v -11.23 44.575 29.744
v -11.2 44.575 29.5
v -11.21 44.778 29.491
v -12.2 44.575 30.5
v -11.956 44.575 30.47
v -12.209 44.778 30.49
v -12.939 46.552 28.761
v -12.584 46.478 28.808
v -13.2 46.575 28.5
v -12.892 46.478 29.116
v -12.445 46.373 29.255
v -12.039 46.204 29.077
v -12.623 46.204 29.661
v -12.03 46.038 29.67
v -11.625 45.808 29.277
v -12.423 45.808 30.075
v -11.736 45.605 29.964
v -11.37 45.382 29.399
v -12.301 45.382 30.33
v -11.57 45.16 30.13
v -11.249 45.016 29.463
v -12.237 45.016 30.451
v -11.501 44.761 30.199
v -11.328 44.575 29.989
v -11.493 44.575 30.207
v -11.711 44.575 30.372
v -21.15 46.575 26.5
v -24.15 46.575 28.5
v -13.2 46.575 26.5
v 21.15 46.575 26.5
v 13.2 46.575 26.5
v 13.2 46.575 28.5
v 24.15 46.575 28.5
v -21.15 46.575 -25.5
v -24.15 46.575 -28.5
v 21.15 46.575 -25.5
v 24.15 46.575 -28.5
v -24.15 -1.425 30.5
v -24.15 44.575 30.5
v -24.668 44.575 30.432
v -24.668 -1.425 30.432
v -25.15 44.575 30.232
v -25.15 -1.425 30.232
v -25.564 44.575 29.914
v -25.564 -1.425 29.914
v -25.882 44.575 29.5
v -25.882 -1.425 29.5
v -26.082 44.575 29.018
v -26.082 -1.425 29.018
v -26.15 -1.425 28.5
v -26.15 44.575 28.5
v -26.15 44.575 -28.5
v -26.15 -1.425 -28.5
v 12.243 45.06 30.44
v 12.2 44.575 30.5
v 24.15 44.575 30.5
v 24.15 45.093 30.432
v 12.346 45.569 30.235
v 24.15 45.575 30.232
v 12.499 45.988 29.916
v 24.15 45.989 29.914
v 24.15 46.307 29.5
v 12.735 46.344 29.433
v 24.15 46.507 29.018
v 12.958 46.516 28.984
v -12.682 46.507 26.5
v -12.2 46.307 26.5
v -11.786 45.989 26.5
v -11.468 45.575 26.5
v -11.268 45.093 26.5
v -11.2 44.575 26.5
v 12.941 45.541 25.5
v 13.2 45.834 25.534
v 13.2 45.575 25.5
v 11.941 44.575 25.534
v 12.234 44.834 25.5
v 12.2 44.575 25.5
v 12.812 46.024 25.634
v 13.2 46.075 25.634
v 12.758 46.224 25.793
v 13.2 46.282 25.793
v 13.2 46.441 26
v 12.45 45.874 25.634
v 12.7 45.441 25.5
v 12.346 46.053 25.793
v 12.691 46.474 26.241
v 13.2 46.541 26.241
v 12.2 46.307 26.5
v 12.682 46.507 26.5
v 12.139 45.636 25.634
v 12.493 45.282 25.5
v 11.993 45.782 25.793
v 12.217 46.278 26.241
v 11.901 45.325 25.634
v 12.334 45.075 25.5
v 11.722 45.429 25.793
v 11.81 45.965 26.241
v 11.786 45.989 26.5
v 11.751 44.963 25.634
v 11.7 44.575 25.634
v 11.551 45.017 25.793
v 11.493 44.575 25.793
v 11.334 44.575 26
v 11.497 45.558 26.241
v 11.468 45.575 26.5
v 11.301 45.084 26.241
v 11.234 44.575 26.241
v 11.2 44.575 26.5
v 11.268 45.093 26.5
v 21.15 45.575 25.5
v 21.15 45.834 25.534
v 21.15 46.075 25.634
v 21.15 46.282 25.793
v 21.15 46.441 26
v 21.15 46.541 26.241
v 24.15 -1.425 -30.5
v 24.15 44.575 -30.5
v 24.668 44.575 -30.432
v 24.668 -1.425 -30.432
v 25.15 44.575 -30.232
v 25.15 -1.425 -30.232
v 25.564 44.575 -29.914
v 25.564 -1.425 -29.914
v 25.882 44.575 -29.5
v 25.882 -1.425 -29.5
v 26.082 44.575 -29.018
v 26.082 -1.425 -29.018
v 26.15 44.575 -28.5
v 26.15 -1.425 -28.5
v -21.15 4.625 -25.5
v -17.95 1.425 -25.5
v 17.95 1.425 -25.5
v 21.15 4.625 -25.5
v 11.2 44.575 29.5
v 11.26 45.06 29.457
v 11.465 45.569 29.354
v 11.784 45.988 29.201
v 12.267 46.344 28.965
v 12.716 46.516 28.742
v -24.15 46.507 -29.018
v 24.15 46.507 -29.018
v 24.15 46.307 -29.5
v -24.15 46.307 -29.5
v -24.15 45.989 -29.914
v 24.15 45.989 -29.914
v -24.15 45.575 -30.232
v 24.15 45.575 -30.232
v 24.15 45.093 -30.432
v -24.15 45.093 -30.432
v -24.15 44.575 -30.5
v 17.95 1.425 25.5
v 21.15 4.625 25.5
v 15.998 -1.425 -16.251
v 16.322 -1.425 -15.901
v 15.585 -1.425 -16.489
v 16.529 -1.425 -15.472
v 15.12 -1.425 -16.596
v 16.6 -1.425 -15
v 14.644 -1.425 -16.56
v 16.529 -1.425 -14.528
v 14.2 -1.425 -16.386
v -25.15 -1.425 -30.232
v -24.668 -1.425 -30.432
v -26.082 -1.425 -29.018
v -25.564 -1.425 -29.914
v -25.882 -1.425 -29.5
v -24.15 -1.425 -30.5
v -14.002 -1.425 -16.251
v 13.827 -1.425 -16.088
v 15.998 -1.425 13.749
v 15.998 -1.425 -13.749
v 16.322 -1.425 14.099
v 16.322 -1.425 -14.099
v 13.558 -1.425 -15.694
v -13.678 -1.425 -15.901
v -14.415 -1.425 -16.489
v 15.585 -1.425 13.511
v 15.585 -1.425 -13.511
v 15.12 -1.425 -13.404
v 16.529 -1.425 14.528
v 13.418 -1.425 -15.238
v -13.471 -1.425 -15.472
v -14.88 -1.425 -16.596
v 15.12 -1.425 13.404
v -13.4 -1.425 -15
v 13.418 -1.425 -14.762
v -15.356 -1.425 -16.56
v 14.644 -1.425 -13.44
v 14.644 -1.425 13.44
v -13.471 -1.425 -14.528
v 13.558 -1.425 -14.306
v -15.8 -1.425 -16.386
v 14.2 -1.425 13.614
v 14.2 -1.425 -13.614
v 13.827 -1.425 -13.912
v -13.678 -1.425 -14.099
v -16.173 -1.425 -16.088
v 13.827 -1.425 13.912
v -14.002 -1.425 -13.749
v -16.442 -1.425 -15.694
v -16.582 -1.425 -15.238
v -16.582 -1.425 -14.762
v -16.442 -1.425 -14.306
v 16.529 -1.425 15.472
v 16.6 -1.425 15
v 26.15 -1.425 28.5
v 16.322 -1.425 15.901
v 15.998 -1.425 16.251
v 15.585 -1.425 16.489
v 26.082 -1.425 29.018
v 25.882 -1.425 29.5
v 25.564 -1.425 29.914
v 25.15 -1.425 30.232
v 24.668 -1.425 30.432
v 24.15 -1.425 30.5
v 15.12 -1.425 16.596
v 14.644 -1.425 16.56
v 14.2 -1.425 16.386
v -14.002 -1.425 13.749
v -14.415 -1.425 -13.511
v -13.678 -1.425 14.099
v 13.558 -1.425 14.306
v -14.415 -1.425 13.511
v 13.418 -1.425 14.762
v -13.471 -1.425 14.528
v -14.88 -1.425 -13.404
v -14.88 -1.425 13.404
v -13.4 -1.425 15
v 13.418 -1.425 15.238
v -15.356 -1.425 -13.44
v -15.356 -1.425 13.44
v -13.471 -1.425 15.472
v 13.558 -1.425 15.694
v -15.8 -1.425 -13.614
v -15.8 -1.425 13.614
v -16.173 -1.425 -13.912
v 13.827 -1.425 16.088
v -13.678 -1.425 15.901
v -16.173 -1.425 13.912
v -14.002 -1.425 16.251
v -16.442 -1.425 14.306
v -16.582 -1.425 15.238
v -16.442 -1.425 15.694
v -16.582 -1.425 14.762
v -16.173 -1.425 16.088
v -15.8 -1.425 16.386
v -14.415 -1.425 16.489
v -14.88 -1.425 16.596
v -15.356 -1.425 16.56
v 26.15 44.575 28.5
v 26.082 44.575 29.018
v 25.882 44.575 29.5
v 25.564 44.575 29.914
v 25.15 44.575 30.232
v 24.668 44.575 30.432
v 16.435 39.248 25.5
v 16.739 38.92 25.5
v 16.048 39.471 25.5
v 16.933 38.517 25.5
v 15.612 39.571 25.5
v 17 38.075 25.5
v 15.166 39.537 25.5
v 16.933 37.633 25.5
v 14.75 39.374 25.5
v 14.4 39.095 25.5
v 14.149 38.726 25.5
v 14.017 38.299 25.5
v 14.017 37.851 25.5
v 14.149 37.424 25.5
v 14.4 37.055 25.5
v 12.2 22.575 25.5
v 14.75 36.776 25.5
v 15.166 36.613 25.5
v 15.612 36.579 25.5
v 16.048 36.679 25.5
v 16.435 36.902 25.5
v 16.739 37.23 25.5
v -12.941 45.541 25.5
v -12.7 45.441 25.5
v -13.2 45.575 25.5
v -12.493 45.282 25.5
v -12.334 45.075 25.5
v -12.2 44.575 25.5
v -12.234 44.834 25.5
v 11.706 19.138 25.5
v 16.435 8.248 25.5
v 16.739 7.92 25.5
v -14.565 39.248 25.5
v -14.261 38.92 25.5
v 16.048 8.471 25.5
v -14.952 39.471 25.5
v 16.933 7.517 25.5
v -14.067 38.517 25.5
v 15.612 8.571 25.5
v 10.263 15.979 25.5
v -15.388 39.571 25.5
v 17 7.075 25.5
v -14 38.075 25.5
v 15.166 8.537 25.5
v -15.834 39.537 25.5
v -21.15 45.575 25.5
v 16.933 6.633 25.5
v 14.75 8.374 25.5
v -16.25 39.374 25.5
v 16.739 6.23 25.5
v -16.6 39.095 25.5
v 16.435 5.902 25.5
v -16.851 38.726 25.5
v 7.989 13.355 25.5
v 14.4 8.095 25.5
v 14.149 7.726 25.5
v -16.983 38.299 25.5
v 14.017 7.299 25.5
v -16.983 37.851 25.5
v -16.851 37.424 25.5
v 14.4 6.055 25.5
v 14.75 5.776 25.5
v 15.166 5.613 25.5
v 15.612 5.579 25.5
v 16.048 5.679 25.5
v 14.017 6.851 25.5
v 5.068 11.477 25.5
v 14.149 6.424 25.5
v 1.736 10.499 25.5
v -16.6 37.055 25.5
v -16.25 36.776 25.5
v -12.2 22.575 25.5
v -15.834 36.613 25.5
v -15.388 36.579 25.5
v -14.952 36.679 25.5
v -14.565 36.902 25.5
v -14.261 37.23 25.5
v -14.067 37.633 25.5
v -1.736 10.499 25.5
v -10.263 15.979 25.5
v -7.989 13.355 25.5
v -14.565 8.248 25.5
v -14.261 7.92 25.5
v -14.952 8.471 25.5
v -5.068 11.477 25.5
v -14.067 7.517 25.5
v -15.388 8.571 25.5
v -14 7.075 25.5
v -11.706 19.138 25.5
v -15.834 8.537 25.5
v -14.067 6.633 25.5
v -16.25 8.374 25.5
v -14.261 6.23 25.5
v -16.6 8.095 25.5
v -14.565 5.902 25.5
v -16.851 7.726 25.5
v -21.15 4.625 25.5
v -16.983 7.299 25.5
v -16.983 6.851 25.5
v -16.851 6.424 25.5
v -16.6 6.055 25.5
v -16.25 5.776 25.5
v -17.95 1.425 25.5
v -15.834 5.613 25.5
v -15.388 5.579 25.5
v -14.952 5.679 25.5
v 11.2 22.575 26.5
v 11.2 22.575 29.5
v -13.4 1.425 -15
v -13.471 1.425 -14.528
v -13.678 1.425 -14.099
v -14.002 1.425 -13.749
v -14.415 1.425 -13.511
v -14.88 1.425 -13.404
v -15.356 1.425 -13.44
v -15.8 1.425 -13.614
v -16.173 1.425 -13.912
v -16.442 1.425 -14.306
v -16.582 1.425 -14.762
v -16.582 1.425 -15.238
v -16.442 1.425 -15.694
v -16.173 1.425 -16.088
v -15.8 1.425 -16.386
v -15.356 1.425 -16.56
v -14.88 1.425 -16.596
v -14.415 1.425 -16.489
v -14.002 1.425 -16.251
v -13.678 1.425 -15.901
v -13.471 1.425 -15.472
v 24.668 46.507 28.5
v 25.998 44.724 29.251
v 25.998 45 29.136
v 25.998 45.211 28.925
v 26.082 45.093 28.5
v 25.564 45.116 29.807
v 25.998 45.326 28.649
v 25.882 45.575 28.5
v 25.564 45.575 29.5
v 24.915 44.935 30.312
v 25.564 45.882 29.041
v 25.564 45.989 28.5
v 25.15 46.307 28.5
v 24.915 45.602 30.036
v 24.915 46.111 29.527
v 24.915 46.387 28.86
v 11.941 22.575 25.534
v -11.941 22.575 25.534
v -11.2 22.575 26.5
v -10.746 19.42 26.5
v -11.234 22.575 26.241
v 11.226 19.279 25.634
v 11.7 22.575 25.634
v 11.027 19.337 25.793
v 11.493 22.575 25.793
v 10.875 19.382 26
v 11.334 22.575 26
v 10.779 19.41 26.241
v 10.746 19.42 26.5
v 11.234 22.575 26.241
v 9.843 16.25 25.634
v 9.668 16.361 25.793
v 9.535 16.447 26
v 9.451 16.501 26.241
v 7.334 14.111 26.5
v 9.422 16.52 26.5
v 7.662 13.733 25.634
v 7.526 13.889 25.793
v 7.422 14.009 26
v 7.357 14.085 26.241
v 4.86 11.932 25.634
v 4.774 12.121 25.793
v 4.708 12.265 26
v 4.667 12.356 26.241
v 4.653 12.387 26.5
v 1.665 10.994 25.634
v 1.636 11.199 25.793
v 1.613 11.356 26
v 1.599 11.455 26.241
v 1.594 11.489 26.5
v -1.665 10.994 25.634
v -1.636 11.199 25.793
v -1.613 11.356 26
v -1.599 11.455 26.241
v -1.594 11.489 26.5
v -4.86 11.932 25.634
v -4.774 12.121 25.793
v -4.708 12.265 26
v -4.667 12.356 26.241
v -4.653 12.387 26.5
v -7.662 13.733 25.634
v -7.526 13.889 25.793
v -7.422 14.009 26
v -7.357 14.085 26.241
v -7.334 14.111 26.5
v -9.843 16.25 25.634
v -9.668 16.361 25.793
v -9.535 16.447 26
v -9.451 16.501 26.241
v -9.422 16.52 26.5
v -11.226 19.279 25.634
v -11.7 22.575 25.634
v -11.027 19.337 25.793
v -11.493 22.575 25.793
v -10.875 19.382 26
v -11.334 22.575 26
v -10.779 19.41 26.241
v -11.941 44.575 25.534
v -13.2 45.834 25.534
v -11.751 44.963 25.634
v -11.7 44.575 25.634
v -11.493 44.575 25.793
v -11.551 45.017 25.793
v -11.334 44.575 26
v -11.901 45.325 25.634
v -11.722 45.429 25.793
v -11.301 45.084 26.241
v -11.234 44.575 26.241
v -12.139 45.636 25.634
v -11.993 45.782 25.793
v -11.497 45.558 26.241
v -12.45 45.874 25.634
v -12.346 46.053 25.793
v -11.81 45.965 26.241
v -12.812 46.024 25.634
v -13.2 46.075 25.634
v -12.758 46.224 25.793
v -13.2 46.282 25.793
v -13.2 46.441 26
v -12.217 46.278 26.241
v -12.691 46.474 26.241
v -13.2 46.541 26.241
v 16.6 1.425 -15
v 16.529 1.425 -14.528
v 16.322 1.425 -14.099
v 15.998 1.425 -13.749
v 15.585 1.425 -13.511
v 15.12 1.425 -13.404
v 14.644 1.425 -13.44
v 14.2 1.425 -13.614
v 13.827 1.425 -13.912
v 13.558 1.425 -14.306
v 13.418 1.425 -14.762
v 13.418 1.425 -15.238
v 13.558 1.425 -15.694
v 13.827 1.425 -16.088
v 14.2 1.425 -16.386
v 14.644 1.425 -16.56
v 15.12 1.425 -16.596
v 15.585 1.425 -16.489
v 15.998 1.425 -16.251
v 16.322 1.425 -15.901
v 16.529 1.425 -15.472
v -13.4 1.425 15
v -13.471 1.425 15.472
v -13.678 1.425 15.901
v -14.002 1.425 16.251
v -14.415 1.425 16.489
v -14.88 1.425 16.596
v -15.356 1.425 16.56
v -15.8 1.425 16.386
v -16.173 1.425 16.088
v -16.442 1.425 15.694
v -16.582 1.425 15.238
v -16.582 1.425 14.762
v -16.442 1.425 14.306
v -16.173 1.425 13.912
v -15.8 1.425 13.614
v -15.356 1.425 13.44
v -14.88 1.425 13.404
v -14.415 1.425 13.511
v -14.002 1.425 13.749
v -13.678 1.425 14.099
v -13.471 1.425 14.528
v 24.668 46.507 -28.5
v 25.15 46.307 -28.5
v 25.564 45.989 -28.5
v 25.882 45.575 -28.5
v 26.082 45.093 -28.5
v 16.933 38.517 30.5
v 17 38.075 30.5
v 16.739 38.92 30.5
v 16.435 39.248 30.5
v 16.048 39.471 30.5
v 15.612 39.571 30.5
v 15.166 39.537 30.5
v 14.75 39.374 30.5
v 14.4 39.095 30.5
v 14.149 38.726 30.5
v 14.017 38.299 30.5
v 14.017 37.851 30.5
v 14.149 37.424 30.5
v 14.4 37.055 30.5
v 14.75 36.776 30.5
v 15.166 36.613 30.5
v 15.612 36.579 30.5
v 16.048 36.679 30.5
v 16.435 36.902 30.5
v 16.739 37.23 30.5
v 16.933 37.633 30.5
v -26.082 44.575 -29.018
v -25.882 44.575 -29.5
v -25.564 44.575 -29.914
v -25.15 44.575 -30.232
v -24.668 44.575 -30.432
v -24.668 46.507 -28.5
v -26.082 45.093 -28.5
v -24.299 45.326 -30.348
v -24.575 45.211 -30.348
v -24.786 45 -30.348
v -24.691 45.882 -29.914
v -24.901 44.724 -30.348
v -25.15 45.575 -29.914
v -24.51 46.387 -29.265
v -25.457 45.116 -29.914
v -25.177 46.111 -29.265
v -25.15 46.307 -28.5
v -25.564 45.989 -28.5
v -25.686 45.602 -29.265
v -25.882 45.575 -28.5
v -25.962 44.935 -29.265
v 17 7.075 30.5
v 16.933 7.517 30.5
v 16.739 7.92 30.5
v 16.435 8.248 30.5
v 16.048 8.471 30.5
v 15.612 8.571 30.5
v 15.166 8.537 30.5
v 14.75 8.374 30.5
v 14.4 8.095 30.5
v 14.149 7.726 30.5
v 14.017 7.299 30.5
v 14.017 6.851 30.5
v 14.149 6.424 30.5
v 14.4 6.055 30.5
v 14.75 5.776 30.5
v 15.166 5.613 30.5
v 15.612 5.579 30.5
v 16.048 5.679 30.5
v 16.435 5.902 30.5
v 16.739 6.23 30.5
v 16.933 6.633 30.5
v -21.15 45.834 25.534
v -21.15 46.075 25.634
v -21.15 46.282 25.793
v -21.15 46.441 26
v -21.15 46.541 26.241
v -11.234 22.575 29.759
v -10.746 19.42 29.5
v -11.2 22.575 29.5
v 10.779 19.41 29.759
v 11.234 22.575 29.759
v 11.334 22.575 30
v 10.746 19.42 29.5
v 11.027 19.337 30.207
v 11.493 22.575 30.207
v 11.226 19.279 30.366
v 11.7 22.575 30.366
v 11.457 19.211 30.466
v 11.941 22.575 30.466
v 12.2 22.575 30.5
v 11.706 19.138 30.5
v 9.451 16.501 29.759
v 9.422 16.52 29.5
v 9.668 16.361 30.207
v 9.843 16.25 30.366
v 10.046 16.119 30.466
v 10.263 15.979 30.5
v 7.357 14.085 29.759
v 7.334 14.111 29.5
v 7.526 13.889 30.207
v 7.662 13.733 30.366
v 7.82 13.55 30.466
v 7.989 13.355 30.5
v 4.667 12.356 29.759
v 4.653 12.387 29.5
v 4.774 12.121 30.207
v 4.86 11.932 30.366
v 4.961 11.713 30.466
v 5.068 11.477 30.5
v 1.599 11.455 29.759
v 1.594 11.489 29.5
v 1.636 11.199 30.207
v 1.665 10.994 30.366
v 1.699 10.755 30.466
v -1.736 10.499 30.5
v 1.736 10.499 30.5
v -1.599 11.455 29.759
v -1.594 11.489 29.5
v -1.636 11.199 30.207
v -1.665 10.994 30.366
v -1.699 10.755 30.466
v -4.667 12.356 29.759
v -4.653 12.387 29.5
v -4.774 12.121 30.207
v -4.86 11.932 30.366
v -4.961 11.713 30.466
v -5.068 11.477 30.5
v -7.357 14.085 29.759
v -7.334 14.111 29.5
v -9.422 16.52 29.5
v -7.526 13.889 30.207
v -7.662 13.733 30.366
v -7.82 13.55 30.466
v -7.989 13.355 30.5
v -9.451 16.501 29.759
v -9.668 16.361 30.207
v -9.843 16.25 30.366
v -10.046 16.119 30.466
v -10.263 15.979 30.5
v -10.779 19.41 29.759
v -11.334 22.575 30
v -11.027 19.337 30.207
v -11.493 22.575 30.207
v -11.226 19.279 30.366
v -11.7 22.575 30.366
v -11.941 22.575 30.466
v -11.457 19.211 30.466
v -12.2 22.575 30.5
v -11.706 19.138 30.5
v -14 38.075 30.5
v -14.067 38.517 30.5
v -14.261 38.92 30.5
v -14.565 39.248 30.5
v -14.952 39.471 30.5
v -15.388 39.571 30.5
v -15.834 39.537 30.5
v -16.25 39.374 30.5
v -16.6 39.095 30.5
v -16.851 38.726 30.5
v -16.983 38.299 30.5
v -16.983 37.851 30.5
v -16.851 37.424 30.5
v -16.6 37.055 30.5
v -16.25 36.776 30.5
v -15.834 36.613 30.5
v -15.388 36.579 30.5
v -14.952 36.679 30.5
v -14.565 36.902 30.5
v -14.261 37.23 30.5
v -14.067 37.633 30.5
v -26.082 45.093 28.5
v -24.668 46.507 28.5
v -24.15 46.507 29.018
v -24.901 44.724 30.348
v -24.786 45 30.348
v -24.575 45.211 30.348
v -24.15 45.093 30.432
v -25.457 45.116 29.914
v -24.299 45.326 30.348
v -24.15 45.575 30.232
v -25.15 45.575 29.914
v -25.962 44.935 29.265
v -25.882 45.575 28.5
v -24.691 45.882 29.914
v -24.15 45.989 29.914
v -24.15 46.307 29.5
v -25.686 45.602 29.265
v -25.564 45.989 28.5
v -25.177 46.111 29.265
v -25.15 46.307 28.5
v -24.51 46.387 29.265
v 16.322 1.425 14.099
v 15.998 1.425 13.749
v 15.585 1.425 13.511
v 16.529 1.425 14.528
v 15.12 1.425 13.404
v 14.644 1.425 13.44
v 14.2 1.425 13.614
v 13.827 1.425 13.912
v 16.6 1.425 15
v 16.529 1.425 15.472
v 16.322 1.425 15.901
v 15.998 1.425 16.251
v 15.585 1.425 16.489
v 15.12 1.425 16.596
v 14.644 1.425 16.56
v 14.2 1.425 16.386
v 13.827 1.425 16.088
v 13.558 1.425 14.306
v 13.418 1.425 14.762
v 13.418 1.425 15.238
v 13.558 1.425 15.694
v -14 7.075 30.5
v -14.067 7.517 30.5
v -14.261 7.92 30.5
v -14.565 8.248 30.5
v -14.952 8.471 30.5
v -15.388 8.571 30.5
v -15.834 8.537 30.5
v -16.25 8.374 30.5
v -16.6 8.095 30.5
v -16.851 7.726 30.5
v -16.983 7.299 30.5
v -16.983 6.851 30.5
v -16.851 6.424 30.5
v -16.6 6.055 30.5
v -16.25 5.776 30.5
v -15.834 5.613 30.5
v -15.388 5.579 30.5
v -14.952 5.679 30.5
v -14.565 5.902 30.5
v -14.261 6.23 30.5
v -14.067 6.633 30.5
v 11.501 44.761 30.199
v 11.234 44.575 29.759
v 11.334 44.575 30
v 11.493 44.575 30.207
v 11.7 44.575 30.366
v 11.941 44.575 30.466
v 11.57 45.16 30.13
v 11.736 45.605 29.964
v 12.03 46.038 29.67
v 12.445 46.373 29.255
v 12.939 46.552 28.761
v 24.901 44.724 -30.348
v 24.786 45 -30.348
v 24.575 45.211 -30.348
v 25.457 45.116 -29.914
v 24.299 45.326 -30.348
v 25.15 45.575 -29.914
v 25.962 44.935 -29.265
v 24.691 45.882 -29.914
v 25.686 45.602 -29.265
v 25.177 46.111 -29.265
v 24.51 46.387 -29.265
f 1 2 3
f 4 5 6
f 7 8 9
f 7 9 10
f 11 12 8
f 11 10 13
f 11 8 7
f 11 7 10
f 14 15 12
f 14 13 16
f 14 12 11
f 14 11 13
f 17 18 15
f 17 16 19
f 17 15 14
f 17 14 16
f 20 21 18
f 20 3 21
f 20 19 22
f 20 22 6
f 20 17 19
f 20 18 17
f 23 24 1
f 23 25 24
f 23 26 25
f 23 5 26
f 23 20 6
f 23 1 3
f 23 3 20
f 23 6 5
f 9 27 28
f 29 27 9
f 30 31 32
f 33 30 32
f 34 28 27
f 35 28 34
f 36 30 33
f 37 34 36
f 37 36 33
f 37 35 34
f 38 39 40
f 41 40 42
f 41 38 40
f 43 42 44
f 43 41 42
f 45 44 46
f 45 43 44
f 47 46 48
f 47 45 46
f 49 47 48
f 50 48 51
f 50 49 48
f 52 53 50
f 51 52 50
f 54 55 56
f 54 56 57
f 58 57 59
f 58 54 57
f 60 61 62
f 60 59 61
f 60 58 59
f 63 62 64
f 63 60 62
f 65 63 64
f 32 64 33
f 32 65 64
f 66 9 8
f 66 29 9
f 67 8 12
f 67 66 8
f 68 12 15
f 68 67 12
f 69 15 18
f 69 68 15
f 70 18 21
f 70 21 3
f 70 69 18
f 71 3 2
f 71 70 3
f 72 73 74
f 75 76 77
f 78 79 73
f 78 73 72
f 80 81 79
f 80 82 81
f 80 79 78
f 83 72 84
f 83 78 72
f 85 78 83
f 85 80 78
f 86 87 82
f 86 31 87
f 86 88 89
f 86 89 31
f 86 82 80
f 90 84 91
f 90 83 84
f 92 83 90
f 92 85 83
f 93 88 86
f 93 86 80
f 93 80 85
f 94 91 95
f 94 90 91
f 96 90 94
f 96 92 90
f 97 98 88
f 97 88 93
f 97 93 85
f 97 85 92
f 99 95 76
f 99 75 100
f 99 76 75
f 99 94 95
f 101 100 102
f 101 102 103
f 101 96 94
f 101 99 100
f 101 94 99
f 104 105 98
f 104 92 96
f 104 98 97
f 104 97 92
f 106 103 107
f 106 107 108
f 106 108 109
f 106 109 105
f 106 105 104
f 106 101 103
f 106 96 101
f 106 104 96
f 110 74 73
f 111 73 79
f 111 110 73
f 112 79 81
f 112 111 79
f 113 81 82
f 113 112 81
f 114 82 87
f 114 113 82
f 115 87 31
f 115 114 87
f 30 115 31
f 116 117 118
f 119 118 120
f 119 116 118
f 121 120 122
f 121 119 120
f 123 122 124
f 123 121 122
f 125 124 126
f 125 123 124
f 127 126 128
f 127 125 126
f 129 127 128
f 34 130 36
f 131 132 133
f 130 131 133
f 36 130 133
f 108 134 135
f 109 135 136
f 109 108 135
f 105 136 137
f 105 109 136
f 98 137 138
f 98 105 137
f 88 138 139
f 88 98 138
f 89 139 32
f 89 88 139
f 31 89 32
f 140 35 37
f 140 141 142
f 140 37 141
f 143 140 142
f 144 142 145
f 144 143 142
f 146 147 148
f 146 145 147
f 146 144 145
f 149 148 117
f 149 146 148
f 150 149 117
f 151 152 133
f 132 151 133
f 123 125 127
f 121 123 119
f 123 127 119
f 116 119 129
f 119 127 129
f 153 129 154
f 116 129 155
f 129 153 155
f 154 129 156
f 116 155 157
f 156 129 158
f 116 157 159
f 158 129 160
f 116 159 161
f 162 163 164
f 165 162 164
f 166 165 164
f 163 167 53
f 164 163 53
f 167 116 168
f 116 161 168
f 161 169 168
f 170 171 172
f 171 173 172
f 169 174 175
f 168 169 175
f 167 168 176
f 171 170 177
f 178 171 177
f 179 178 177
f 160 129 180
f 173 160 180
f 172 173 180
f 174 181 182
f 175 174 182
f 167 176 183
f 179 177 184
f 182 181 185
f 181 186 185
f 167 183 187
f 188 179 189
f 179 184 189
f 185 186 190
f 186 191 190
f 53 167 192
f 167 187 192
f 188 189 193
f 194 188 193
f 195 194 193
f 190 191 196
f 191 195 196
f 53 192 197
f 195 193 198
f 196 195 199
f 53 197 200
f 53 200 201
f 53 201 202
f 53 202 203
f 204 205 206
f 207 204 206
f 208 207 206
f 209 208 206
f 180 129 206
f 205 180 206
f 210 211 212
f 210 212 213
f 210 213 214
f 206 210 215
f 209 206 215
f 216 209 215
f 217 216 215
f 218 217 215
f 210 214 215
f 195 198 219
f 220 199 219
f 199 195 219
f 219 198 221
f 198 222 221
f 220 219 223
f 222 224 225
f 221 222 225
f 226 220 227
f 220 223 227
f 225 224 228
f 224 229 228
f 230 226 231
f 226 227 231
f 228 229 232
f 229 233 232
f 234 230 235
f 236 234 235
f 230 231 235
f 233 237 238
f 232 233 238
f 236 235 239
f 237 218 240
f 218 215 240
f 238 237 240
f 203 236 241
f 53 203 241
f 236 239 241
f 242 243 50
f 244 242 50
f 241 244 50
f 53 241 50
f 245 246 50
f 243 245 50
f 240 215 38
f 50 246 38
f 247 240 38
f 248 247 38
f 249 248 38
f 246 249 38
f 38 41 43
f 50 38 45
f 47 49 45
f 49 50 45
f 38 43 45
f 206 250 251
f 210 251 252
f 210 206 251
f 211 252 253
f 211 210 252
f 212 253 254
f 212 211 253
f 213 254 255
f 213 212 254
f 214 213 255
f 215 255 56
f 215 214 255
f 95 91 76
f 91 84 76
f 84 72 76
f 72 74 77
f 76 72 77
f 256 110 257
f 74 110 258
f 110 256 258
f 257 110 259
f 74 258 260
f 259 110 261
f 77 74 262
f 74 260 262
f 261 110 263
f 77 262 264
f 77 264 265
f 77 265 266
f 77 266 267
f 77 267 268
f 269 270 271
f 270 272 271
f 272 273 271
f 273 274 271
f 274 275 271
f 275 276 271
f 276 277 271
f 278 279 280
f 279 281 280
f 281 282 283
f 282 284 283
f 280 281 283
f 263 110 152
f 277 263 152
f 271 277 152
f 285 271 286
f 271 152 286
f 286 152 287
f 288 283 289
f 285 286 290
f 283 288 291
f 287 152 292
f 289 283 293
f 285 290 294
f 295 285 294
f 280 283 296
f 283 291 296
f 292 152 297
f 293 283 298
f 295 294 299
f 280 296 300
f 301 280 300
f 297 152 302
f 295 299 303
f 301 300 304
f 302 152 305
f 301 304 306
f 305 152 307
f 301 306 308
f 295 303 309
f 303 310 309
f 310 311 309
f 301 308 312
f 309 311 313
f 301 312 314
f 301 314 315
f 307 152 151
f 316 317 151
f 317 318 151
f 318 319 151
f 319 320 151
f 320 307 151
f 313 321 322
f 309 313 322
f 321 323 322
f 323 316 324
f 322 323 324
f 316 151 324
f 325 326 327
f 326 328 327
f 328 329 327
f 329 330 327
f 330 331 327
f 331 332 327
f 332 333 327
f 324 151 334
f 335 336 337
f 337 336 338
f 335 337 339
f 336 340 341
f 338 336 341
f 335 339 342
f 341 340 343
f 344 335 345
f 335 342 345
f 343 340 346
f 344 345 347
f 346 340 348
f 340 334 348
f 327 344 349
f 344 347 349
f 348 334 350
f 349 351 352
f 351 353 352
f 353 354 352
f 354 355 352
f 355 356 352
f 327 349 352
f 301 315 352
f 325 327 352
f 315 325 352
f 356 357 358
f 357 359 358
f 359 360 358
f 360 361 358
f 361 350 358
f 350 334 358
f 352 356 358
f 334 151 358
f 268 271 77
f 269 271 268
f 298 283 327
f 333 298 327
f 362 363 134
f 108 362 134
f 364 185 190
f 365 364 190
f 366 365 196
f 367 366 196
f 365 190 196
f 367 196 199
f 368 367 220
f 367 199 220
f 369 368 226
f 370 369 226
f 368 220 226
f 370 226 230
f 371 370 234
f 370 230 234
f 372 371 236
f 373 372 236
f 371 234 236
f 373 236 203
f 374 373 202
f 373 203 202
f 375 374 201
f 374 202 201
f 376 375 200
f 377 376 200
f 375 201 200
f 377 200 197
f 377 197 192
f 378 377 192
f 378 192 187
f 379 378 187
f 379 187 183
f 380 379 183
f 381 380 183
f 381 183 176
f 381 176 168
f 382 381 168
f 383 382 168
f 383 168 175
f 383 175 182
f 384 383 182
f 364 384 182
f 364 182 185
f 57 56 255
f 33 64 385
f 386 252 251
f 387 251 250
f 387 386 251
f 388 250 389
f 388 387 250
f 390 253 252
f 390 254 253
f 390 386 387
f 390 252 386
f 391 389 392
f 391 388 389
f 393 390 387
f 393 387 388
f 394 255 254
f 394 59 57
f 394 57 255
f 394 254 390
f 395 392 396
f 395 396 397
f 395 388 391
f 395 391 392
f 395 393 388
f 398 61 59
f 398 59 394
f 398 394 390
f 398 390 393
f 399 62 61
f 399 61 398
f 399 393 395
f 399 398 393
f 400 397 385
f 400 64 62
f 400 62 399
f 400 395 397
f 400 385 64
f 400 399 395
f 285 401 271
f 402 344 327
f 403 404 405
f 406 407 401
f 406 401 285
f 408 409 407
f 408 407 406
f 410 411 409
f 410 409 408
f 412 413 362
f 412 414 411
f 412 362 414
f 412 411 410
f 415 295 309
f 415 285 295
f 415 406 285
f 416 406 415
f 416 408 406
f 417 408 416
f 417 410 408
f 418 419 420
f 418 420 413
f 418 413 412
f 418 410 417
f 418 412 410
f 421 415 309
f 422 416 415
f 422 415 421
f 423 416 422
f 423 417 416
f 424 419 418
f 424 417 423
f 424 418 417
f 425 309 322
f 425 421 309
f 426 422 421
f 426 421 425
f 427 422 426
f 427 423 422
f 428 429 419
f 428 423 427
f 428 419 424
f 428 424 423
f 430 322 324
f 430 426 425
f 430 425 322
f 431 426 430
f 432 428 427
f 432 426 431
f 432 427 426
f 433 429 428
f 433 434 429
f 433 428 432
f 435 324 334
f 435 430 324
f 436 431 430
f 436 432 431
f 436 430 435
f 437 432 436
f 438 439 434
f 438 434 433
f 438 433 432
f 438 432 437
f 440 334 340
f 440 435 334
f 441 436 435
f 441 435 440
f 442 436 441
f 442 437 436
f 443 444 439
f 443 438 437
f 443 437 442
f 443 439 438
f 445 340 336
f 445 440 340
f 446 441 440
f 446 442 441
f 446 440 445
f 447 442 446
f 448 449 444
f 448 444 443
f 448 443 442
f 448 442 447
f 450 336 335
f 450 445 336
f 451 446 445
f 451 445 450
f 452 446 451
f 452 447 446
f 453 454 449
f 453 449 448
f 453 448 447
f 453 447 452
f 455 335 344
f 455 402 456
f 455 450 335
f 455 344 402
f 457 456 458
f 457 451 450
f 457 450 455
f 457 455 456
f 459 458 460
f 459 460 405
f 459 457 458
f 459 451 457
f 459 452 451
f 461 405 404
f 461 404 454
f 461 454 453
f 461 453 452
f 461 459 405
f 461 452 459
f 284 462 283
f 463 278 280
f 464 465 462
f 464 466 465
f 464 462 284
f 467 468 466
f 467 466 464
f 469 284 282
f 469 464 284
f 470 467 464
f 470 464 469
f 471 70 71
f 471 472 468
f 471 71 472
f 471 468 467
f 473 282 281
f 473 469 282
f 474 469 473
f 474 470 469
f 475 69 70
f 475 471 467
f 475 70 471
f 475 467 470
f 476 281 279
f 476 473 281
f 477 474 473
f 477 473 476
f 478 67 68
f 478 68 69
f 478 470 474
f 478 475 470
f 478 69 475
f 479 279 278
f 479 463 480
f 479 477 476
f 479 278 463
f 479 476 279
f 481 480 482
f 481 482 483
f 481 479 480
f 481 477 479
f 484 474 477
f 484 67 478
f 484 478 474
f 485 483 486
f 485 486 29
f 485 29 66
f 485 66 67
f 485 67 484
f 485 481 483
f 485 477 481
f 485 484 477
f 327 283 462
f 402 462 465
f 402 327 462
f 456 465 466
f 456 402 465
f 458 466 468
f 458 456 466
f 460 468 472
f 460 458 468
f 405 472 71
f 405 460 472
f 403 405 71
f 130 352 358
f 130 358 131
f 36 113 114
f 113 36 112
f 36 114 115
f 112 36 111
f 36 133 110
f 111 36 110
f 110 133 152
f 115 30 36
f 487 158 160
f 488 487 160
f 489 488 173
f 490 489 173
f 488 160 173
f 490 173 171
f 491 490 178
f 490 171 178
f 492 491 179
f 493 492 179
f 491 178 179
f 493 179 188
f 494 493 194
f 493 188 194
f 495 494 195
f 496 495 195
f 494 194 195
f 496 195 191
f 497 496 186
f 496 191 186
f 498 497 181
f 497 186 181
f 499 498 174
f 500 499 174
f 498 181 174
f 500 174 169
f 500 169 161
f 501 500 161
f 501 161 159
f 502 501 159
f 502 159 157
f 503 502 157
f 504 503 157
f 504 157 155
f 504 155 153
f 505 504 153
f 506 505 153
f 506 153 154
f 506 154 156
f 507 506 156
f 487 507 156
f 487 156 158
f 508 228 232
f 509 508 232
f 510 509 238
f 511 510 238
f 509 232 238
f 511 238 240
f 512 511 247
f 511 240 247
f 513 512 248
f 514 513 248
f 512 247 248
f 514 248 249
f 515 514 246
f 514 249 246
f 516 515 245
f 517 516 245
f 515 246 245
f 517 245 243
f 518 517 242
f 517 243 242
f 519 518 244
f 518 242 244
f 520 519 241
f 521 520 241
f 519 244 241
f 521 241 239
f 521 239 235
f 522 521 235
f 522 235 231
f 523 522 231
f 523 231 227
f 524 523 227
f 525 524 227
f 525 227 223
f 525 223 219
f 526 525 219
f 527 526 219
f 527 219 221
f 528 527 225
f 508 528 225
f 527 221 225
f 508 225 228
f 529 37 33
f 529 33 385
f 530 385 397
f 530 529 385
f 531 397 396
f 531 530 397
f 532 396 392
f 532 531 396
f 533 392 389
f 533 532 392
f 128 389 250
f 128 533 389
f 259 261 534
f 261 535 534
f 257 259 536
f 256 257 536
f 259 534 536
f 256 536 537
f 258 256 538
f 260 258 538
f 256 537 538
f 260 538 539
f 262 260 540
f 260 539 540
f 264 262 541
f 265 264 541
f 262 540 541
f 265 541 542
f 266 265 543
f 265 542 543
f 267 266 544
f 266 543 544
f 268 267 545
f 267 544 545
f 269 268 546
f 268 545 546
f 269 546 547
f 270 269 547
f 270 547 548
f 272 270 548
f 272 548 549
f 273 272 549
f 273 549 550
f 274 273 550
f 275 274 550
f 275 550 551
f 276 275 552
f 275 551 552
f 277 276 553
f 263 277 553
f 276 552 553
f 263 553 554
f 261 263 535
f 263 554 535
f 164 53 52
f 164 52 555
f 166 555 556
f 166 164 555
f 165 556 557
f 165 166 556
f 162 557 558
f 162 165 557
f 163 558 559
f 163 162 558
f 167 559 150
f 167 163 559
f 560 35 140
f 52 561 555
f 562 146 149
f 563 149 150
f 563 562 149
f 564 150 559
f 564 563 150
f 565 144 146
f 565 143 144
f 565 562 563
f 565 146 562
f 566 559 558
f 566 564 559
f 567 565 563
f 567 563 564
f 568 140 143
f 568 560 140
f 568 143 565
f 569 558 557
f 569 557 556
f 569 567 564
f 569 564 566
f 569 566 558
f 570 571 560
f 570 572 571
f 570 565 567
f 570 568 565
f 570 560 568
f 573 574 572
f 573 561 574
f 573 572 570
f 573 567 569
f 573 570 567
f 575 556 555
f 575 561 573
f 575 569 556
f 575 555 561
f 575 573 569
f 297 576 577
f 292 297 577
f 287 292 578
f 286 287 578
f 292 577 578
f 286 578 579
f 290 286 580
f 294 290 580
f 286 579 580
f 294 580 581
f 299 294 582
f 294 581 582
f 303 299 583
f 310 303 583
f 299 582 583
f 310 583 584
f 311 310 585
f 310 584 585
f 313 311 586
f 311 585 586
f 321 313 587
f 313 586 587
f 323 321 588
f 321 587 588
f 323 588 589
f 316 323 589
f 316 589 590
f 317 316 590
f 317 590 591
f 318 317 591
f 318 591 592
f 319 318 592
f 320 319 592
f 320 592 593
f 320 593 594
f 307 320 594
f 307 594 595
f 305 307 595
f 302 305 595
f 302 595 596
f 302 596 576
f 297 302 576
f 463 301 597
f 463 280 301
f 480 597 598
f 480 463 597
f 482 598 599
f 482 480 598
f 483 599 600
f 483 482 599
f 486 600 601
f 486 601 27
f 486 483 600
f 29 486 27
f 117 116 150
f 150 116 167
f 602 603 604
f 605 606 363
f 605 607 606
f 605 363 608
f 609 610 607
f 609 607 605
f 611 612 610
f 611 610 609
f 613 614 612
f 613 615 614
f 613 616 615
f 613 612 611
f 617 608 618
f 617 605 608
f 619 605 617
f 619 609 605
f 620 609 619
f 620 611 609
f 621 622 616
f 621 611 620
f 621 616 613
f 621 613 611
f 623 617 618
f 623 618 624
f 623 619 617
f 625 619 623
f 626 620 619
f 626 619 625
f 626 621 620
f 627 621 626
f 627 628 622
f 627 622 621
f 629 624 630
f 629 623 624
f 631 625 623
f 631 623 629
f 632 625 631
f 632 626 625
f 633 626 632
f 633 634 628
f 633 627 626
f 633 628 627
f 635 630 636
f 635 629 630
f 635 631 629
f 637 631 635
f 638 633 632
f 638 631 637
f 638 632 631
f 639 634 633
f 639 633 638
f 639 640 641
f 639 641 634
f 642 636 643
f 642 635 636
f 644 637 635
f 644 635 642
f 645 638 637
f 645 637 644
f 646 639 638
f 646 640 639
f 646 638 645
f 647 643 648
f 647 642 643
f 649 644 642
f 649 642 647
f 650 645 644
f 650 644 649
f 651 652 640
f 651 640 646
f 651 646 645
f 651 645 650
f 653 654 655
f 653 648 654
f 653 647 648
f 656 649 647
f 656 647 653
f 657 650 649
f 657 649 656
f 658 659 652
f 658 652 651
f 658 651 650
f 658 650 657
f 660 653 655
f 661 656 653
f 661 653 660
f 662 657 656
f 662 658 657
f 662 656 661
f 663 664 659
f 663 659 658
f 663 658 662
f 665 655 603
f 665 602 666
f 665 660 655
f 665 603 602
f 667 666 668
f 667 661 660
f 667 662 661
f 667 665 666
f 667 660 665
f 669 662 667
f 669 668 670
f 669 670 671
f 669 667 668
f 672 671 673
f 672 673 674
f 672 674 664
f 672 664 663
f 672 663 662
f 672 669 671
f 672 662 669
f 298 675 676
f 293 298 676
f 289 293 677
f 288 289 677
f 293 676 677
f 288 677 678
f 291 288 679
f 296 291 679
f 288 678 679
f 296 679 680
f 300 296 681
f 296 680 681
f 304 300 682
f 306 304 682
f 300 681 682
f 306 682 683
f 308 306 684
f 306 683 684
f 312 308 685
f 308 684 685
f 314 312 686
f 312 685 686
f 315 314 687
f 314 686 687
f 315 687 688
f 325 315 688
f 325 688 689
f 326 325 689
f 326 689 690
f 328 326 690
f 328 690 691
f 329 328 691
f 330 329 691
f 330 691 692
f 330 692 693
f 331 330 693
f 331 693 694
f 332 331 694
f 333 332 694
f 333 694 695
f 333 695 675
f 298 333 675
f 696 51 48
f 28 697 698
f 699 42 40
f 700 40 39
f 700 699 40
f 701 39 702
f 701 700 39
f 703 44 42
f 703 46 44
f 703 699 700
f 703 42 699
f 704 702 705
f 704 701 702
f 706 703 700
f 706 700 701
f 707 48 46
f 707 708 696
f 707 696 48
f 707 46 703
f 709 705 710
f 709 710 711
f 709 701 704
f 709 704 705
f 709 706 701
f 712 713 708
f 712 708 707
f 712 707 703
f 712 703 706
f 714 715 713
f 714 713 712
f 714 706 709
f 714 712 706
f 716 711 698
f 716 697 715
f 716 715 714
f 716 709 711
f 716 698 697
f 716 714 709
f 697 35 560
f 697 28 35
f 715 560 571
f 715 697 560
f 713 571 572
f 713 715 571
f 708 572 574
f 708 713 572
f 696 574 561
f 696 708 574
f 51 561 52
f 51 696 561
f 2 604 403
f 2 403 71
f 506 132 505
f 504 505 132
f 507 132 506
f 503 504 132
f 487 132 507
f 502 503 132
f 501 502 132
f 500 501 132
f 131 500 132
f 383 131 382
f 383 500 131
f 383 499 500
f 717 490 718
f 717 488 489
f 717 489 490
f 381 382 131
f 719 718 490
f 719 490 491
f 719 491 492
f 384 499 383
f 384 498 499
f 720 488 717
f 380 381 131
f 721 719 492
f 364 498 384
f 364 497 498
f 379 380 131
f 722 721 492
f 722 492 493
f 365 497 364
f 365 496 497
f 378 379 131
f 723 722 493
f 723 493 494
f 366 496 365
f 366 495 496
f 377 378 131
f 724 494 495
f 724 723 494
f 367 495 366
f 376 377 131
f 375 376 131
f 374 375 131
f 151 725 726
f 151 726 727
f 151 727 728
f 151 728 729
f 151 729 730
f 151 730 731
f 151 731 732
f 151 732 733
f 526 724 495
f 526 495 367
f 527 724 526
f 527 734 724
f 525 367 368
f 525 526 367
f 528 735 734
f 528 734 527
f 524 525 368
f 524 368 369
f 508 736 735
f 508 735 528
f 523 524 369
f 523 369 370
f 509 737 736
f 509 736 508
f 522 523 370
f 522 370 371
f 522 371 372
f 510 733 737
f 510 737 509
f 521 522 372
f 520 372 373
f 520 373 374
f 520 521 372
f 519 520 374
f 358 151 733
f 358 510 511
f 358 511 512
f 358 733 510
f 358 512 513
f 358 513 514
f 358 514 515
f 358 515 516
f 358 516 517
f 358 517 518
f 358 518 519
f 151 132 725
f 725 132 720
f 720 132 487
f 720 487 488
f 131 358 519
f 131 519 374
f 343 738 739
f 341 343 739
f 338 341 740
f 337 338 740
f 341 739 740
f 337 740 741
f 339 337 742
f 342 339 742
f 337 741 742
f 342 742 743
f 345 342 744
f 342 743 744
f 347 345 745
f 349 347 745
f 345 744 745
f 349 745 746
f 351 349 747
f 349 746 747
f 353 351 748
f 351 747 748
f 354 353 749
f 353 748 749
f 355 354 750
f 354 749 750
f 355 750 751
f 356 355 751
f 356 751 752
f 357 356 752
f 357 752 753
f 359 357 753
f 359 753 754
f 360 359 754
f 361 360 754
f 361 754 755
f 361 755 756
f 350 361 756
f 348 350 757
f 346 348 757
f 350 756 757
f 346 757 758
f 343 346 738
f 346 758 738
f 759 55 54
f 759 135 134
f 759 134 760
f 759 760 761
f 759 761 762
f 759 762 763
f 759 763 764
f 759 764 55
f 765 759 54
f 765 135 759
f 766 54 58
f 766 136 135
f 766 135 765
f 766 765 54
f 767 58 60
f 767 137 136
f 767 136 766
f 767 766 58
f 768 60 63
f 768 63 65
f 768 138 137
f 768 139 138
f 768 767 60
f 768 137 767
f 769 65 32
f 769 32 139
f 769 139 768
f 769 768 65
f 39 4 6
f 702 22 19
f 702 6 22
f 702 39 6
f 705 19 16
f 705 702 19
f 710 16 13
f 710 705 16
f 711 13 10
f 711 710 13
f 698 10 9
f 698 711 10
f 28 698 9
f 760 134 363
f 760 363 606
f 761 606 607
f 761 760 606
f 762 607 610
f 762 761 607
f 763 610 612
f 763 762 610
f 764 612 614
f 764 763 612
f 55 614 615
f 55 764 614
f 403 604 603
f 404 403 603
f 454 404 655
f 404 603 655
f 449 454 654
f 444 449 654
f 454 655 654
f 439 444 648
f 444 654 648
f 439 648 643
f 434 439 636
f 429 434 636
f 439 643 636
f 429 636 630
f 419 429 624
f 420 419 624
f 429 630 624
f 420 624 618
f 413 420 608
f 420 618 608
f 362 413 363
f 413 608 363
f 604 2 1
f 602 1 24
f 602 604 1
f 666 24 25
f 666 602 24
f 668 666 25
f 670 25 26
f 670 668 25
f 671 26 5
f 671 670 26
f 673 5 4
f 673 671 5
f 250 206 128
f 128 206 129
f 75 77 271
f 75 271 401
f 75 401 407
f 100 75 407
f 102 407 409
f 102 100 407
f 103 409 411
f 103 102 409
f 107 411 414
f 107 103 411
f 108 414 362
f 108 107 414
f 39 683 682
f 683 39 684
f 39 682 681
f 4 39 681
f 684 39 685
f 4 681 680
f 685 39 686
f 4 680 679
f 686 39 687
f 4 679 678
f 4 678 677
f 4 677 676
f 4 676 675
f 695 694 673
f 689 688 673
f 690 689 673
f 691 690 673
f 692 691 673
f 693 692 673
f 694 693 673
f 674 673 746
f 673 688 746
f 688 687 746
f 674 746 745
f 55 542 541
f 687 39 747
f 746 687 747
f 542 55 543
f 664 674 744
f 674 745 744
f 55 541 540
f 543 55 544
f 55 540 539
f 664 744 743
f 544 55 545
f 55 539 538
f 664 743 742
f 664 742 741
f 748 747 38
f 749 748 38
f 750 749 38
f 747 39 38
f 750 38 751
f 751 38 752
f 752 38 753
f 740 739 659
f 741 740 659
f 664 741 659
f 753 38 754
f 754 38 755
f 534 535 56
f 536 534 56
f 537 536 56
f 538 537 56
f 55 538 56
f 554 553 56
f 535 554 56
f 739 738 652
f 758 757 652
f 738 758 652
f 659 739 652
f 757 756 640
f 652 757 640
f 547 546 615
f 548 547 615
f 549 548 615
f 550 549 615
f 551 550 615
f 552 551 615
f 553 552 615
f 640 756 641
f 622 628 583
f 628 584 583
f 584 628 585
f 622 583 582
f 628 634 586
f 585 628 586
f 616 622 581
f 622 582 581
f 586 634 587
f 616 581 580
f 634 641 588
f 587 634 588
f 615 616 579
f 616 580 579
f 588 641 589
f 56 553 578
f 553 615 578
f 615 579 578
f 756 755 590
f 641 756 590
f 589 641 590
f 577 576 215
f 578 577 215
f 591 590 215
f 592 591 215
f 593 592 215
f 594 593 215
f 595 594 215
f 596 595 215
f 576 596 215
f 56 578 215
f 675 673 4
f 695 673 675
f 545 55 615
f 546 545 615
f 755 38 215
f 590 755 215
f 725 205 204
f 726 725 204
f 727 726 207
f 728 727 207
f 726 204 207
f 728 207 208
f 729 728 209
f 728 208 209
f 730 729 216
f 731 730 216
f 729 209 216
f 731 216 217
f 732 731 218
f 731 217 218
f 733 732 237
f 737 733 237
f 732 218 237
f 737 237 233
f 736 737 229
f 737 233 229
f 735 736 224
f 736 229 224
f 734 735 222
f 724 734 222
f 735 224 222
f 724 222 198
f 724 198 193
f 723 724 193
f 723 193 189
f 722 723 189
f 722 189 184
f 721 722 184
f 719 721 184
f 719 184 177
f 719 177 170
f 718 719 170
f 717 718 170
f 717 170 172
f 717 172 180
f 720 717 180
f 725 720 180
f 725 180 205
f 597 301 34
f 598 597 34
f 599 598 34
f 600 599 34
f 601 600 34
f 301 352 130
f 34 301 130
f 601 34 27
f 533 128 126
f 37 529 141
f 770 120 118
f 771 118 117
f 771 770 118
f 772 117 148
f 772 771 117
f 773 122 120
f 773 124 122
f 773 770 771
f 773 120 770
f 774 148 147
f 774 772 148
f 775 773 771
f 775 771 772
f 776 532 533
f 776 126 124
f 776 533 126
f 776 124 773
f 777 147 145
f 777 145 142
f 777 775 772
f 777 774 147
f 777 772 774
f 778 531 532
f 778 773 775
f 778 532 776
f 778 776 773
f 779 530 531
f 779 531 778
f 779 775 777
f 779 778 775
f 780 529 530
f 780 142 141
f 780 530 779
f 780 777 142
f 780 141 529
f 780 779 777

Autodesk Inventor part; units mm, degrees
sketch "Эскиз1" plane through (0, 0, 0) normal (0, 1, 0) x (-1, 0, 0)
  line L0 (21.15, 25.5) -> (-21.15, 25.5)
  line L1 (-21.15, 25.5) -> (-21.15, -25.5)
  line L2 (-21.15, -25.5) -> (21.15, -25.5)
  line L3 (21.15, -25.5) -> (21.15, 25.5)
  line L4 (21.15, 25.5) -> (-21.15, -25.5) construction
  line L5 (-21.15, 25.5) -> (21.15, -25.5) construction
  point P0 (0, 0)
  dimension "d2" = 51
  dimension "d3" = 42.3
extrude "Выдавливание1" add sketch "Эскиз1" along normal mid plane 2.85
sketch "Эскиз2" plane through (0, 1.425, 0) normal (0, 1, 0) x (1, 0, 0)
  line L0 (-21.15, -25.5) -> (-21.15, 25.5) projected
  line L1 (-21.15, 25.5) -> (-26.15, 25.5)
  line L2 (-26.15, 25.5) -> (-26.15, -25.5)
  line L3 (-26.15, -25.5) -> (-21.15, -25.5)
  line L4 (-21.15, -25.5) -> (-21.15, 25.5)
  point P0 (0, 0)
  dimension "d4" = 5
extrude "Выдавливание2" add sketch "Эскиз2" along normal blind 45.15 and the other way blind 2.85
mirror "Зеркальное отражение1" about plane through (0, 0, 0) normal (1, 0, 0) of "Выдавливание2"
chamfer "Фаска1" distance 3.2 angle 45 2 edges at (-21.15, 1.425, 0) (21.15, 1.425, 0)
sketch "Эскиз3" plane through (0, 1.425, 0) normal (0, 1, 0) x (1, 0, 0)
  line L0 (-26.15, 25.5) -> (26.15, 25.5) projected
  line L1 (-26.15, 25.5) -> (26.15, 25.5)
  line L2 (26.15, 25.5) -> (26.15, 30.5)
  line L3 (26.15, 30.5) -> (-26.15, 30.5)
  line L4 (-26.15, 30.5) -> (-26.15, 25.5)
  point P0 (0, 0)
  dimension "d17" = 5
extrude "Выдавливание3" add sketch "Эскиз3" along normal blind 45.15 and the other way blind 2.85
mirror "Зеркальное отражение2" about plane through (0, 0, 0) normal (0, 0, 1) of "Выдавливание3"
sketch "Эскиз7" plane through (-26.15, -1.425, 30.5) normal (0, 0, 1) x (1, 0, 0)
  circle A0 centre (26.15, 24) radius 11 projected
  circle A1 centre (26.15, 24) radius 11.2
  point P0 (26.15, 1.425)
  dimension "d22" = 22.4
extrude "Выдавливание5" cut sketch "Эскиз7" against normal up to next contours A0 | A1
sketch "Эскиз8" plane through (-26.15, -1.425, 30.5) normal (0, 0, 1) x (1, 0, 0)
  circle A0 centre (26.15, 24) radius 11.2 projected
  line L0 (14.95, 24) -> (14.95, 48)
  line L1 (5, 48) -> (47.3, 48) projected
  line L2 (37.35, 24) -> (37.35, 48.1316)
  point P0 (26.15, 1.425)
  point P1 (37.35, 48)
  dimension "d23" = 22.4
extrude "Выдавливание6" cut sketch "Эскиз8" against normal up to next contours A0 L0 L1 L2
fillet "Сопряжение1" radius 2 11 edges at (-11.2, 46.575, 28) (11.2, 46.575, 28) (-26.15, 46.575, 0) (-18.675, 46.575, 30.5) (18.675, 46.575, 30.5) (26.15, 46.575, 0) (0, 46.575, -30.5) (26.15, 22.575, 30.5) (-26.15, 22.575, 30.5) (-26.15, 22.575, -30.5) (26.15, 22.575, -30.5)
fillet "Сопряжение2" radius 1 12 edges at (0, 11.375, 25.5) (11.2, 33.575, 25.5) (11.7858, 45.9892, 25.5) (17.175, 46.575, 25.5) (-11.7858, 45.9892, 25.5) (-17.175, 46.575, 25.5) (-11.2, 33.575, 25.5) (-11.7858, 45.9892, 29.9142) (0, 11.375, 30.5) (11.2, 33.575, 30.5) (11.7858, 45.9892, 29.9142) (-11.2, 33.575, 30.5)
sketch "Эскиз9" plane through (-24.15, -1.425, 30.5) normal (0, 0, 1) x (1, 0, 0)
  circle A0 centre (8.65, 39.5) radius 1.5
  circle A1 centre (39.65, 39.5) radius 1.5
  circle A2 centre (39.65, 8.5) radius 1.5
  circle A3 centre (8.65, 8.5) radius 1.5
  line L0 (8.65, 39.5) -> (39.65, 39.5) construction
  line L1 (39.65, 39.5) -> (39.65, 8.5) construction
  line L2 (39.65, 8.5) -> (8.65, 8.5) construction
  line L3 (8.65, 8.5) -> (8.65, 39.5) construction
  arc A4 (12.95, 24) -> (35.35, 24) centre (24.15, 24) ccw projected
  line L4 (8.65, 39.5) -> (39.65, 8.5) construction
  line L5 (39.65, 39.5) -> (8.65, 8.5) construction
  line L6 (24.15, 62.1506) -> (24.15, -10.3584) projected
  point P0 (24.15, 1.425)
  point P1 (24.15, 24)
  point P2 (24.15, 24)
  dimension "d28" = 3
  dimension "d29" = 31
extrude "Выдавливание7" cut sketch "Эскиз9" against normal up to next
sketch "Эскиз10" plane through (0, -1.425, 0) normal (0, -1, 0) x (1, 0, 0)
  line L0 (15, -15) -> (-15, -15) construction
  line L1 (-15, -15) -> (-15, 15) construction
  line L2 (-15, 15) -> (15, 15) construction
  line L3 (15, 15) -> (15, -15) construction
  line L4 (15, -15) -> (-15, 15) construction
  line L5 (-15, -15) -> (15, 15) construction
  circle A0 centre (-15, -15) radius 1.6
  circle A1 centre (-15, 15) radius 1.6
  circle A2 centre (15, -15) radius 1.6
  circle A3 centre (15, 15) radius 1.6
  point P0 (0, 0)
  dimension "d32" = 30
  dimension "d33" = 3.2
extrude "Выдавливание8" cut sketch "Эскиз10" against normal up to next
properties part number "Крепление_мотора"
